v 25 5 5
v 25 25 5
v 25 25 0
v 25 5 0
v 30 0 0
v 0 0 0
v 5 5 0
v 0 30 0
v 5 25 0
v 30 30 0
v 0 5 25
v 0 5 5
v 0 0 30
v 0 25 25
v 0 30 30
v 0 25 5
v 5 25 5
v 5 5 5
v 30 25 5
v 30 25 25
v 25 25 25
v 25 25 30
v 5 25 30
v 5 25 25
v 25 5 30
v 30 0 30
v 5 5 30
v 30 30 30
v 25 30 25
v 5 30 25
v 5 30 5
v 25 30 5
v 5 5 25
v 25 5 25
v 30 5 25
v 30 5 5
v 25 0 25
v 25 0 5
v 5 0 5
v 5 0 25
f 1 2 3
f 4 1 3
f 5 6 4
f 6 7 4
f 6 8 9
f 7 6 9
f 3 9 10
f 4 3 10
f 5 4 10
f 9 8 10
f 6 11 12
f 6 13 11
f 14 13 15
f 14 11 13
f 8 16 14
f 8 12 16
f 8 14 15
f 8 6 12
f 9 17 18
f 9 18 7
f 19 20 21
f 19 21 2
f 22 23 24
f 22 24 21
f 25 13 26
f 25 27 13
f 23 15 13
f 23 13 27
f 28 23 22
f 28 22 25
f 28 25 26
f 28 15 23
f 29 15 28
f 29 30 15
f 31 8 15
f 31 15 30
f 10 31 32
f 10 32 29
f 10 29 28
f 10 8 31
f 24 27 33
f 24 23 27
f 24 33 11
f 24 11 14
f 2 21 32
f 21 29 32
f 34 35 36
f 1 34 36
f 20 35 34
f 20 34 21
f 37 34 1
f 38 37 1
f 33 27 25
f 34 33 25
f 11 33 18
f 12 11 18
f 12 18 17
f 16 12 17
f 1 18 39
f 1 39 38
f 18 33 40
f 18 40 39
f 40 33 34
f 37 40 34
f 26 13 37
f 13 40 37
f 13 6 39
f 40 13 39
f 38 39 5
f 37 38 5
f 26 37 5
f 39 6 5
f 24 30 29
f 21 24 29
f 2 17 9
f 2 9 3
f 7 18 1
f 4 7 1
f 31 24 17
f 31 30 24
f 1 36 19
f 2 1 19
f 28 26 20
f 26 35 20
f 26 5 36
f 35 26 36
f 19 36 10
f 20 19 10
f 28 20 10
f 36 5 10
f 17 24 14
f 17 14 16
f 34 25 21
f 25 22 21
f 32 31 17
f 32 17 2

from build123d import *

# Parameters (mm, degrees)
ESQUISSE1_W             = 30
ESQUISSE1_H             = 30
BOSS_EXTRU_1_DEPTH      = 30
ESQUISSE2_W             = 20
ESQUISSE2_H             = 20
ENL_V_MAT_EXTRU_1_DEPTH = 31
ESQUISSE3_W             = 20
ESQUISSE3_H             = 20
ENL_V_MAT_EXTRU_2_DEPTH = 31
ESQUISSE4_W             = 20
ESQUISSE4_H             = 20
ENL_V_MAT_EXTRU_3_DEPTH = 31


with BuildPart() as part:
    # Esquisse1 → Boss.-Extru.1 (new body)
    with BuildSketch(Plane.XY):
        with Locations((15, 15)):
            Rectangle(ESQUISSE1_W, ESQUISSE1_H)
    extrude(amount=BOSS_EXTRU_1_DEPTH)

    # Esquisse2 → Enlèv. mat.-Extru.1 (cut, through all)
    with BuildSketch(Plane(origin=(0, 30, 0), x_dir=(1, 0, 0), z_dir=(0, 1, 0))):
        with Locations((15, -15)):
            Rectangle(ESQUISSE2_W, ESQUISSE2_H)
    extrude(amount=-ENL_V_MAT_EXTRU_1_DEPTH, mode=Mode.SUBTRACT)

    # Esquisse3 → Enlèv. mat.-Extru.2 (cut, through all)
    with BuildSketch(Plane.XY.offset(30)):
        with Locations((15, 15)):
            Rectangle(ESQUISSE3_W, ESQUISSE3_H)
    extrude(amount=-ENL_V_MAT_EXTRU_2_DEPTH, mode=Mode.SUBTRACT)

    # Esquisse4 → Enlèv. mat.-Extru.3 (cut, through all)
    with BuildSketch(Plane(origin=(30, 0, 0), x_dir=(0, 0, -1), z_dir=(1, 0, 0))):
        with Locations((-15, 15)):
            Rectangle(ESQUISSE4_W, ESQUISSE4_H)
    extrude(amount=-ENL_V_MAT_EXTRU_3_DEPTH, mode=Mode.SUBTRACT)


solid = part.part
